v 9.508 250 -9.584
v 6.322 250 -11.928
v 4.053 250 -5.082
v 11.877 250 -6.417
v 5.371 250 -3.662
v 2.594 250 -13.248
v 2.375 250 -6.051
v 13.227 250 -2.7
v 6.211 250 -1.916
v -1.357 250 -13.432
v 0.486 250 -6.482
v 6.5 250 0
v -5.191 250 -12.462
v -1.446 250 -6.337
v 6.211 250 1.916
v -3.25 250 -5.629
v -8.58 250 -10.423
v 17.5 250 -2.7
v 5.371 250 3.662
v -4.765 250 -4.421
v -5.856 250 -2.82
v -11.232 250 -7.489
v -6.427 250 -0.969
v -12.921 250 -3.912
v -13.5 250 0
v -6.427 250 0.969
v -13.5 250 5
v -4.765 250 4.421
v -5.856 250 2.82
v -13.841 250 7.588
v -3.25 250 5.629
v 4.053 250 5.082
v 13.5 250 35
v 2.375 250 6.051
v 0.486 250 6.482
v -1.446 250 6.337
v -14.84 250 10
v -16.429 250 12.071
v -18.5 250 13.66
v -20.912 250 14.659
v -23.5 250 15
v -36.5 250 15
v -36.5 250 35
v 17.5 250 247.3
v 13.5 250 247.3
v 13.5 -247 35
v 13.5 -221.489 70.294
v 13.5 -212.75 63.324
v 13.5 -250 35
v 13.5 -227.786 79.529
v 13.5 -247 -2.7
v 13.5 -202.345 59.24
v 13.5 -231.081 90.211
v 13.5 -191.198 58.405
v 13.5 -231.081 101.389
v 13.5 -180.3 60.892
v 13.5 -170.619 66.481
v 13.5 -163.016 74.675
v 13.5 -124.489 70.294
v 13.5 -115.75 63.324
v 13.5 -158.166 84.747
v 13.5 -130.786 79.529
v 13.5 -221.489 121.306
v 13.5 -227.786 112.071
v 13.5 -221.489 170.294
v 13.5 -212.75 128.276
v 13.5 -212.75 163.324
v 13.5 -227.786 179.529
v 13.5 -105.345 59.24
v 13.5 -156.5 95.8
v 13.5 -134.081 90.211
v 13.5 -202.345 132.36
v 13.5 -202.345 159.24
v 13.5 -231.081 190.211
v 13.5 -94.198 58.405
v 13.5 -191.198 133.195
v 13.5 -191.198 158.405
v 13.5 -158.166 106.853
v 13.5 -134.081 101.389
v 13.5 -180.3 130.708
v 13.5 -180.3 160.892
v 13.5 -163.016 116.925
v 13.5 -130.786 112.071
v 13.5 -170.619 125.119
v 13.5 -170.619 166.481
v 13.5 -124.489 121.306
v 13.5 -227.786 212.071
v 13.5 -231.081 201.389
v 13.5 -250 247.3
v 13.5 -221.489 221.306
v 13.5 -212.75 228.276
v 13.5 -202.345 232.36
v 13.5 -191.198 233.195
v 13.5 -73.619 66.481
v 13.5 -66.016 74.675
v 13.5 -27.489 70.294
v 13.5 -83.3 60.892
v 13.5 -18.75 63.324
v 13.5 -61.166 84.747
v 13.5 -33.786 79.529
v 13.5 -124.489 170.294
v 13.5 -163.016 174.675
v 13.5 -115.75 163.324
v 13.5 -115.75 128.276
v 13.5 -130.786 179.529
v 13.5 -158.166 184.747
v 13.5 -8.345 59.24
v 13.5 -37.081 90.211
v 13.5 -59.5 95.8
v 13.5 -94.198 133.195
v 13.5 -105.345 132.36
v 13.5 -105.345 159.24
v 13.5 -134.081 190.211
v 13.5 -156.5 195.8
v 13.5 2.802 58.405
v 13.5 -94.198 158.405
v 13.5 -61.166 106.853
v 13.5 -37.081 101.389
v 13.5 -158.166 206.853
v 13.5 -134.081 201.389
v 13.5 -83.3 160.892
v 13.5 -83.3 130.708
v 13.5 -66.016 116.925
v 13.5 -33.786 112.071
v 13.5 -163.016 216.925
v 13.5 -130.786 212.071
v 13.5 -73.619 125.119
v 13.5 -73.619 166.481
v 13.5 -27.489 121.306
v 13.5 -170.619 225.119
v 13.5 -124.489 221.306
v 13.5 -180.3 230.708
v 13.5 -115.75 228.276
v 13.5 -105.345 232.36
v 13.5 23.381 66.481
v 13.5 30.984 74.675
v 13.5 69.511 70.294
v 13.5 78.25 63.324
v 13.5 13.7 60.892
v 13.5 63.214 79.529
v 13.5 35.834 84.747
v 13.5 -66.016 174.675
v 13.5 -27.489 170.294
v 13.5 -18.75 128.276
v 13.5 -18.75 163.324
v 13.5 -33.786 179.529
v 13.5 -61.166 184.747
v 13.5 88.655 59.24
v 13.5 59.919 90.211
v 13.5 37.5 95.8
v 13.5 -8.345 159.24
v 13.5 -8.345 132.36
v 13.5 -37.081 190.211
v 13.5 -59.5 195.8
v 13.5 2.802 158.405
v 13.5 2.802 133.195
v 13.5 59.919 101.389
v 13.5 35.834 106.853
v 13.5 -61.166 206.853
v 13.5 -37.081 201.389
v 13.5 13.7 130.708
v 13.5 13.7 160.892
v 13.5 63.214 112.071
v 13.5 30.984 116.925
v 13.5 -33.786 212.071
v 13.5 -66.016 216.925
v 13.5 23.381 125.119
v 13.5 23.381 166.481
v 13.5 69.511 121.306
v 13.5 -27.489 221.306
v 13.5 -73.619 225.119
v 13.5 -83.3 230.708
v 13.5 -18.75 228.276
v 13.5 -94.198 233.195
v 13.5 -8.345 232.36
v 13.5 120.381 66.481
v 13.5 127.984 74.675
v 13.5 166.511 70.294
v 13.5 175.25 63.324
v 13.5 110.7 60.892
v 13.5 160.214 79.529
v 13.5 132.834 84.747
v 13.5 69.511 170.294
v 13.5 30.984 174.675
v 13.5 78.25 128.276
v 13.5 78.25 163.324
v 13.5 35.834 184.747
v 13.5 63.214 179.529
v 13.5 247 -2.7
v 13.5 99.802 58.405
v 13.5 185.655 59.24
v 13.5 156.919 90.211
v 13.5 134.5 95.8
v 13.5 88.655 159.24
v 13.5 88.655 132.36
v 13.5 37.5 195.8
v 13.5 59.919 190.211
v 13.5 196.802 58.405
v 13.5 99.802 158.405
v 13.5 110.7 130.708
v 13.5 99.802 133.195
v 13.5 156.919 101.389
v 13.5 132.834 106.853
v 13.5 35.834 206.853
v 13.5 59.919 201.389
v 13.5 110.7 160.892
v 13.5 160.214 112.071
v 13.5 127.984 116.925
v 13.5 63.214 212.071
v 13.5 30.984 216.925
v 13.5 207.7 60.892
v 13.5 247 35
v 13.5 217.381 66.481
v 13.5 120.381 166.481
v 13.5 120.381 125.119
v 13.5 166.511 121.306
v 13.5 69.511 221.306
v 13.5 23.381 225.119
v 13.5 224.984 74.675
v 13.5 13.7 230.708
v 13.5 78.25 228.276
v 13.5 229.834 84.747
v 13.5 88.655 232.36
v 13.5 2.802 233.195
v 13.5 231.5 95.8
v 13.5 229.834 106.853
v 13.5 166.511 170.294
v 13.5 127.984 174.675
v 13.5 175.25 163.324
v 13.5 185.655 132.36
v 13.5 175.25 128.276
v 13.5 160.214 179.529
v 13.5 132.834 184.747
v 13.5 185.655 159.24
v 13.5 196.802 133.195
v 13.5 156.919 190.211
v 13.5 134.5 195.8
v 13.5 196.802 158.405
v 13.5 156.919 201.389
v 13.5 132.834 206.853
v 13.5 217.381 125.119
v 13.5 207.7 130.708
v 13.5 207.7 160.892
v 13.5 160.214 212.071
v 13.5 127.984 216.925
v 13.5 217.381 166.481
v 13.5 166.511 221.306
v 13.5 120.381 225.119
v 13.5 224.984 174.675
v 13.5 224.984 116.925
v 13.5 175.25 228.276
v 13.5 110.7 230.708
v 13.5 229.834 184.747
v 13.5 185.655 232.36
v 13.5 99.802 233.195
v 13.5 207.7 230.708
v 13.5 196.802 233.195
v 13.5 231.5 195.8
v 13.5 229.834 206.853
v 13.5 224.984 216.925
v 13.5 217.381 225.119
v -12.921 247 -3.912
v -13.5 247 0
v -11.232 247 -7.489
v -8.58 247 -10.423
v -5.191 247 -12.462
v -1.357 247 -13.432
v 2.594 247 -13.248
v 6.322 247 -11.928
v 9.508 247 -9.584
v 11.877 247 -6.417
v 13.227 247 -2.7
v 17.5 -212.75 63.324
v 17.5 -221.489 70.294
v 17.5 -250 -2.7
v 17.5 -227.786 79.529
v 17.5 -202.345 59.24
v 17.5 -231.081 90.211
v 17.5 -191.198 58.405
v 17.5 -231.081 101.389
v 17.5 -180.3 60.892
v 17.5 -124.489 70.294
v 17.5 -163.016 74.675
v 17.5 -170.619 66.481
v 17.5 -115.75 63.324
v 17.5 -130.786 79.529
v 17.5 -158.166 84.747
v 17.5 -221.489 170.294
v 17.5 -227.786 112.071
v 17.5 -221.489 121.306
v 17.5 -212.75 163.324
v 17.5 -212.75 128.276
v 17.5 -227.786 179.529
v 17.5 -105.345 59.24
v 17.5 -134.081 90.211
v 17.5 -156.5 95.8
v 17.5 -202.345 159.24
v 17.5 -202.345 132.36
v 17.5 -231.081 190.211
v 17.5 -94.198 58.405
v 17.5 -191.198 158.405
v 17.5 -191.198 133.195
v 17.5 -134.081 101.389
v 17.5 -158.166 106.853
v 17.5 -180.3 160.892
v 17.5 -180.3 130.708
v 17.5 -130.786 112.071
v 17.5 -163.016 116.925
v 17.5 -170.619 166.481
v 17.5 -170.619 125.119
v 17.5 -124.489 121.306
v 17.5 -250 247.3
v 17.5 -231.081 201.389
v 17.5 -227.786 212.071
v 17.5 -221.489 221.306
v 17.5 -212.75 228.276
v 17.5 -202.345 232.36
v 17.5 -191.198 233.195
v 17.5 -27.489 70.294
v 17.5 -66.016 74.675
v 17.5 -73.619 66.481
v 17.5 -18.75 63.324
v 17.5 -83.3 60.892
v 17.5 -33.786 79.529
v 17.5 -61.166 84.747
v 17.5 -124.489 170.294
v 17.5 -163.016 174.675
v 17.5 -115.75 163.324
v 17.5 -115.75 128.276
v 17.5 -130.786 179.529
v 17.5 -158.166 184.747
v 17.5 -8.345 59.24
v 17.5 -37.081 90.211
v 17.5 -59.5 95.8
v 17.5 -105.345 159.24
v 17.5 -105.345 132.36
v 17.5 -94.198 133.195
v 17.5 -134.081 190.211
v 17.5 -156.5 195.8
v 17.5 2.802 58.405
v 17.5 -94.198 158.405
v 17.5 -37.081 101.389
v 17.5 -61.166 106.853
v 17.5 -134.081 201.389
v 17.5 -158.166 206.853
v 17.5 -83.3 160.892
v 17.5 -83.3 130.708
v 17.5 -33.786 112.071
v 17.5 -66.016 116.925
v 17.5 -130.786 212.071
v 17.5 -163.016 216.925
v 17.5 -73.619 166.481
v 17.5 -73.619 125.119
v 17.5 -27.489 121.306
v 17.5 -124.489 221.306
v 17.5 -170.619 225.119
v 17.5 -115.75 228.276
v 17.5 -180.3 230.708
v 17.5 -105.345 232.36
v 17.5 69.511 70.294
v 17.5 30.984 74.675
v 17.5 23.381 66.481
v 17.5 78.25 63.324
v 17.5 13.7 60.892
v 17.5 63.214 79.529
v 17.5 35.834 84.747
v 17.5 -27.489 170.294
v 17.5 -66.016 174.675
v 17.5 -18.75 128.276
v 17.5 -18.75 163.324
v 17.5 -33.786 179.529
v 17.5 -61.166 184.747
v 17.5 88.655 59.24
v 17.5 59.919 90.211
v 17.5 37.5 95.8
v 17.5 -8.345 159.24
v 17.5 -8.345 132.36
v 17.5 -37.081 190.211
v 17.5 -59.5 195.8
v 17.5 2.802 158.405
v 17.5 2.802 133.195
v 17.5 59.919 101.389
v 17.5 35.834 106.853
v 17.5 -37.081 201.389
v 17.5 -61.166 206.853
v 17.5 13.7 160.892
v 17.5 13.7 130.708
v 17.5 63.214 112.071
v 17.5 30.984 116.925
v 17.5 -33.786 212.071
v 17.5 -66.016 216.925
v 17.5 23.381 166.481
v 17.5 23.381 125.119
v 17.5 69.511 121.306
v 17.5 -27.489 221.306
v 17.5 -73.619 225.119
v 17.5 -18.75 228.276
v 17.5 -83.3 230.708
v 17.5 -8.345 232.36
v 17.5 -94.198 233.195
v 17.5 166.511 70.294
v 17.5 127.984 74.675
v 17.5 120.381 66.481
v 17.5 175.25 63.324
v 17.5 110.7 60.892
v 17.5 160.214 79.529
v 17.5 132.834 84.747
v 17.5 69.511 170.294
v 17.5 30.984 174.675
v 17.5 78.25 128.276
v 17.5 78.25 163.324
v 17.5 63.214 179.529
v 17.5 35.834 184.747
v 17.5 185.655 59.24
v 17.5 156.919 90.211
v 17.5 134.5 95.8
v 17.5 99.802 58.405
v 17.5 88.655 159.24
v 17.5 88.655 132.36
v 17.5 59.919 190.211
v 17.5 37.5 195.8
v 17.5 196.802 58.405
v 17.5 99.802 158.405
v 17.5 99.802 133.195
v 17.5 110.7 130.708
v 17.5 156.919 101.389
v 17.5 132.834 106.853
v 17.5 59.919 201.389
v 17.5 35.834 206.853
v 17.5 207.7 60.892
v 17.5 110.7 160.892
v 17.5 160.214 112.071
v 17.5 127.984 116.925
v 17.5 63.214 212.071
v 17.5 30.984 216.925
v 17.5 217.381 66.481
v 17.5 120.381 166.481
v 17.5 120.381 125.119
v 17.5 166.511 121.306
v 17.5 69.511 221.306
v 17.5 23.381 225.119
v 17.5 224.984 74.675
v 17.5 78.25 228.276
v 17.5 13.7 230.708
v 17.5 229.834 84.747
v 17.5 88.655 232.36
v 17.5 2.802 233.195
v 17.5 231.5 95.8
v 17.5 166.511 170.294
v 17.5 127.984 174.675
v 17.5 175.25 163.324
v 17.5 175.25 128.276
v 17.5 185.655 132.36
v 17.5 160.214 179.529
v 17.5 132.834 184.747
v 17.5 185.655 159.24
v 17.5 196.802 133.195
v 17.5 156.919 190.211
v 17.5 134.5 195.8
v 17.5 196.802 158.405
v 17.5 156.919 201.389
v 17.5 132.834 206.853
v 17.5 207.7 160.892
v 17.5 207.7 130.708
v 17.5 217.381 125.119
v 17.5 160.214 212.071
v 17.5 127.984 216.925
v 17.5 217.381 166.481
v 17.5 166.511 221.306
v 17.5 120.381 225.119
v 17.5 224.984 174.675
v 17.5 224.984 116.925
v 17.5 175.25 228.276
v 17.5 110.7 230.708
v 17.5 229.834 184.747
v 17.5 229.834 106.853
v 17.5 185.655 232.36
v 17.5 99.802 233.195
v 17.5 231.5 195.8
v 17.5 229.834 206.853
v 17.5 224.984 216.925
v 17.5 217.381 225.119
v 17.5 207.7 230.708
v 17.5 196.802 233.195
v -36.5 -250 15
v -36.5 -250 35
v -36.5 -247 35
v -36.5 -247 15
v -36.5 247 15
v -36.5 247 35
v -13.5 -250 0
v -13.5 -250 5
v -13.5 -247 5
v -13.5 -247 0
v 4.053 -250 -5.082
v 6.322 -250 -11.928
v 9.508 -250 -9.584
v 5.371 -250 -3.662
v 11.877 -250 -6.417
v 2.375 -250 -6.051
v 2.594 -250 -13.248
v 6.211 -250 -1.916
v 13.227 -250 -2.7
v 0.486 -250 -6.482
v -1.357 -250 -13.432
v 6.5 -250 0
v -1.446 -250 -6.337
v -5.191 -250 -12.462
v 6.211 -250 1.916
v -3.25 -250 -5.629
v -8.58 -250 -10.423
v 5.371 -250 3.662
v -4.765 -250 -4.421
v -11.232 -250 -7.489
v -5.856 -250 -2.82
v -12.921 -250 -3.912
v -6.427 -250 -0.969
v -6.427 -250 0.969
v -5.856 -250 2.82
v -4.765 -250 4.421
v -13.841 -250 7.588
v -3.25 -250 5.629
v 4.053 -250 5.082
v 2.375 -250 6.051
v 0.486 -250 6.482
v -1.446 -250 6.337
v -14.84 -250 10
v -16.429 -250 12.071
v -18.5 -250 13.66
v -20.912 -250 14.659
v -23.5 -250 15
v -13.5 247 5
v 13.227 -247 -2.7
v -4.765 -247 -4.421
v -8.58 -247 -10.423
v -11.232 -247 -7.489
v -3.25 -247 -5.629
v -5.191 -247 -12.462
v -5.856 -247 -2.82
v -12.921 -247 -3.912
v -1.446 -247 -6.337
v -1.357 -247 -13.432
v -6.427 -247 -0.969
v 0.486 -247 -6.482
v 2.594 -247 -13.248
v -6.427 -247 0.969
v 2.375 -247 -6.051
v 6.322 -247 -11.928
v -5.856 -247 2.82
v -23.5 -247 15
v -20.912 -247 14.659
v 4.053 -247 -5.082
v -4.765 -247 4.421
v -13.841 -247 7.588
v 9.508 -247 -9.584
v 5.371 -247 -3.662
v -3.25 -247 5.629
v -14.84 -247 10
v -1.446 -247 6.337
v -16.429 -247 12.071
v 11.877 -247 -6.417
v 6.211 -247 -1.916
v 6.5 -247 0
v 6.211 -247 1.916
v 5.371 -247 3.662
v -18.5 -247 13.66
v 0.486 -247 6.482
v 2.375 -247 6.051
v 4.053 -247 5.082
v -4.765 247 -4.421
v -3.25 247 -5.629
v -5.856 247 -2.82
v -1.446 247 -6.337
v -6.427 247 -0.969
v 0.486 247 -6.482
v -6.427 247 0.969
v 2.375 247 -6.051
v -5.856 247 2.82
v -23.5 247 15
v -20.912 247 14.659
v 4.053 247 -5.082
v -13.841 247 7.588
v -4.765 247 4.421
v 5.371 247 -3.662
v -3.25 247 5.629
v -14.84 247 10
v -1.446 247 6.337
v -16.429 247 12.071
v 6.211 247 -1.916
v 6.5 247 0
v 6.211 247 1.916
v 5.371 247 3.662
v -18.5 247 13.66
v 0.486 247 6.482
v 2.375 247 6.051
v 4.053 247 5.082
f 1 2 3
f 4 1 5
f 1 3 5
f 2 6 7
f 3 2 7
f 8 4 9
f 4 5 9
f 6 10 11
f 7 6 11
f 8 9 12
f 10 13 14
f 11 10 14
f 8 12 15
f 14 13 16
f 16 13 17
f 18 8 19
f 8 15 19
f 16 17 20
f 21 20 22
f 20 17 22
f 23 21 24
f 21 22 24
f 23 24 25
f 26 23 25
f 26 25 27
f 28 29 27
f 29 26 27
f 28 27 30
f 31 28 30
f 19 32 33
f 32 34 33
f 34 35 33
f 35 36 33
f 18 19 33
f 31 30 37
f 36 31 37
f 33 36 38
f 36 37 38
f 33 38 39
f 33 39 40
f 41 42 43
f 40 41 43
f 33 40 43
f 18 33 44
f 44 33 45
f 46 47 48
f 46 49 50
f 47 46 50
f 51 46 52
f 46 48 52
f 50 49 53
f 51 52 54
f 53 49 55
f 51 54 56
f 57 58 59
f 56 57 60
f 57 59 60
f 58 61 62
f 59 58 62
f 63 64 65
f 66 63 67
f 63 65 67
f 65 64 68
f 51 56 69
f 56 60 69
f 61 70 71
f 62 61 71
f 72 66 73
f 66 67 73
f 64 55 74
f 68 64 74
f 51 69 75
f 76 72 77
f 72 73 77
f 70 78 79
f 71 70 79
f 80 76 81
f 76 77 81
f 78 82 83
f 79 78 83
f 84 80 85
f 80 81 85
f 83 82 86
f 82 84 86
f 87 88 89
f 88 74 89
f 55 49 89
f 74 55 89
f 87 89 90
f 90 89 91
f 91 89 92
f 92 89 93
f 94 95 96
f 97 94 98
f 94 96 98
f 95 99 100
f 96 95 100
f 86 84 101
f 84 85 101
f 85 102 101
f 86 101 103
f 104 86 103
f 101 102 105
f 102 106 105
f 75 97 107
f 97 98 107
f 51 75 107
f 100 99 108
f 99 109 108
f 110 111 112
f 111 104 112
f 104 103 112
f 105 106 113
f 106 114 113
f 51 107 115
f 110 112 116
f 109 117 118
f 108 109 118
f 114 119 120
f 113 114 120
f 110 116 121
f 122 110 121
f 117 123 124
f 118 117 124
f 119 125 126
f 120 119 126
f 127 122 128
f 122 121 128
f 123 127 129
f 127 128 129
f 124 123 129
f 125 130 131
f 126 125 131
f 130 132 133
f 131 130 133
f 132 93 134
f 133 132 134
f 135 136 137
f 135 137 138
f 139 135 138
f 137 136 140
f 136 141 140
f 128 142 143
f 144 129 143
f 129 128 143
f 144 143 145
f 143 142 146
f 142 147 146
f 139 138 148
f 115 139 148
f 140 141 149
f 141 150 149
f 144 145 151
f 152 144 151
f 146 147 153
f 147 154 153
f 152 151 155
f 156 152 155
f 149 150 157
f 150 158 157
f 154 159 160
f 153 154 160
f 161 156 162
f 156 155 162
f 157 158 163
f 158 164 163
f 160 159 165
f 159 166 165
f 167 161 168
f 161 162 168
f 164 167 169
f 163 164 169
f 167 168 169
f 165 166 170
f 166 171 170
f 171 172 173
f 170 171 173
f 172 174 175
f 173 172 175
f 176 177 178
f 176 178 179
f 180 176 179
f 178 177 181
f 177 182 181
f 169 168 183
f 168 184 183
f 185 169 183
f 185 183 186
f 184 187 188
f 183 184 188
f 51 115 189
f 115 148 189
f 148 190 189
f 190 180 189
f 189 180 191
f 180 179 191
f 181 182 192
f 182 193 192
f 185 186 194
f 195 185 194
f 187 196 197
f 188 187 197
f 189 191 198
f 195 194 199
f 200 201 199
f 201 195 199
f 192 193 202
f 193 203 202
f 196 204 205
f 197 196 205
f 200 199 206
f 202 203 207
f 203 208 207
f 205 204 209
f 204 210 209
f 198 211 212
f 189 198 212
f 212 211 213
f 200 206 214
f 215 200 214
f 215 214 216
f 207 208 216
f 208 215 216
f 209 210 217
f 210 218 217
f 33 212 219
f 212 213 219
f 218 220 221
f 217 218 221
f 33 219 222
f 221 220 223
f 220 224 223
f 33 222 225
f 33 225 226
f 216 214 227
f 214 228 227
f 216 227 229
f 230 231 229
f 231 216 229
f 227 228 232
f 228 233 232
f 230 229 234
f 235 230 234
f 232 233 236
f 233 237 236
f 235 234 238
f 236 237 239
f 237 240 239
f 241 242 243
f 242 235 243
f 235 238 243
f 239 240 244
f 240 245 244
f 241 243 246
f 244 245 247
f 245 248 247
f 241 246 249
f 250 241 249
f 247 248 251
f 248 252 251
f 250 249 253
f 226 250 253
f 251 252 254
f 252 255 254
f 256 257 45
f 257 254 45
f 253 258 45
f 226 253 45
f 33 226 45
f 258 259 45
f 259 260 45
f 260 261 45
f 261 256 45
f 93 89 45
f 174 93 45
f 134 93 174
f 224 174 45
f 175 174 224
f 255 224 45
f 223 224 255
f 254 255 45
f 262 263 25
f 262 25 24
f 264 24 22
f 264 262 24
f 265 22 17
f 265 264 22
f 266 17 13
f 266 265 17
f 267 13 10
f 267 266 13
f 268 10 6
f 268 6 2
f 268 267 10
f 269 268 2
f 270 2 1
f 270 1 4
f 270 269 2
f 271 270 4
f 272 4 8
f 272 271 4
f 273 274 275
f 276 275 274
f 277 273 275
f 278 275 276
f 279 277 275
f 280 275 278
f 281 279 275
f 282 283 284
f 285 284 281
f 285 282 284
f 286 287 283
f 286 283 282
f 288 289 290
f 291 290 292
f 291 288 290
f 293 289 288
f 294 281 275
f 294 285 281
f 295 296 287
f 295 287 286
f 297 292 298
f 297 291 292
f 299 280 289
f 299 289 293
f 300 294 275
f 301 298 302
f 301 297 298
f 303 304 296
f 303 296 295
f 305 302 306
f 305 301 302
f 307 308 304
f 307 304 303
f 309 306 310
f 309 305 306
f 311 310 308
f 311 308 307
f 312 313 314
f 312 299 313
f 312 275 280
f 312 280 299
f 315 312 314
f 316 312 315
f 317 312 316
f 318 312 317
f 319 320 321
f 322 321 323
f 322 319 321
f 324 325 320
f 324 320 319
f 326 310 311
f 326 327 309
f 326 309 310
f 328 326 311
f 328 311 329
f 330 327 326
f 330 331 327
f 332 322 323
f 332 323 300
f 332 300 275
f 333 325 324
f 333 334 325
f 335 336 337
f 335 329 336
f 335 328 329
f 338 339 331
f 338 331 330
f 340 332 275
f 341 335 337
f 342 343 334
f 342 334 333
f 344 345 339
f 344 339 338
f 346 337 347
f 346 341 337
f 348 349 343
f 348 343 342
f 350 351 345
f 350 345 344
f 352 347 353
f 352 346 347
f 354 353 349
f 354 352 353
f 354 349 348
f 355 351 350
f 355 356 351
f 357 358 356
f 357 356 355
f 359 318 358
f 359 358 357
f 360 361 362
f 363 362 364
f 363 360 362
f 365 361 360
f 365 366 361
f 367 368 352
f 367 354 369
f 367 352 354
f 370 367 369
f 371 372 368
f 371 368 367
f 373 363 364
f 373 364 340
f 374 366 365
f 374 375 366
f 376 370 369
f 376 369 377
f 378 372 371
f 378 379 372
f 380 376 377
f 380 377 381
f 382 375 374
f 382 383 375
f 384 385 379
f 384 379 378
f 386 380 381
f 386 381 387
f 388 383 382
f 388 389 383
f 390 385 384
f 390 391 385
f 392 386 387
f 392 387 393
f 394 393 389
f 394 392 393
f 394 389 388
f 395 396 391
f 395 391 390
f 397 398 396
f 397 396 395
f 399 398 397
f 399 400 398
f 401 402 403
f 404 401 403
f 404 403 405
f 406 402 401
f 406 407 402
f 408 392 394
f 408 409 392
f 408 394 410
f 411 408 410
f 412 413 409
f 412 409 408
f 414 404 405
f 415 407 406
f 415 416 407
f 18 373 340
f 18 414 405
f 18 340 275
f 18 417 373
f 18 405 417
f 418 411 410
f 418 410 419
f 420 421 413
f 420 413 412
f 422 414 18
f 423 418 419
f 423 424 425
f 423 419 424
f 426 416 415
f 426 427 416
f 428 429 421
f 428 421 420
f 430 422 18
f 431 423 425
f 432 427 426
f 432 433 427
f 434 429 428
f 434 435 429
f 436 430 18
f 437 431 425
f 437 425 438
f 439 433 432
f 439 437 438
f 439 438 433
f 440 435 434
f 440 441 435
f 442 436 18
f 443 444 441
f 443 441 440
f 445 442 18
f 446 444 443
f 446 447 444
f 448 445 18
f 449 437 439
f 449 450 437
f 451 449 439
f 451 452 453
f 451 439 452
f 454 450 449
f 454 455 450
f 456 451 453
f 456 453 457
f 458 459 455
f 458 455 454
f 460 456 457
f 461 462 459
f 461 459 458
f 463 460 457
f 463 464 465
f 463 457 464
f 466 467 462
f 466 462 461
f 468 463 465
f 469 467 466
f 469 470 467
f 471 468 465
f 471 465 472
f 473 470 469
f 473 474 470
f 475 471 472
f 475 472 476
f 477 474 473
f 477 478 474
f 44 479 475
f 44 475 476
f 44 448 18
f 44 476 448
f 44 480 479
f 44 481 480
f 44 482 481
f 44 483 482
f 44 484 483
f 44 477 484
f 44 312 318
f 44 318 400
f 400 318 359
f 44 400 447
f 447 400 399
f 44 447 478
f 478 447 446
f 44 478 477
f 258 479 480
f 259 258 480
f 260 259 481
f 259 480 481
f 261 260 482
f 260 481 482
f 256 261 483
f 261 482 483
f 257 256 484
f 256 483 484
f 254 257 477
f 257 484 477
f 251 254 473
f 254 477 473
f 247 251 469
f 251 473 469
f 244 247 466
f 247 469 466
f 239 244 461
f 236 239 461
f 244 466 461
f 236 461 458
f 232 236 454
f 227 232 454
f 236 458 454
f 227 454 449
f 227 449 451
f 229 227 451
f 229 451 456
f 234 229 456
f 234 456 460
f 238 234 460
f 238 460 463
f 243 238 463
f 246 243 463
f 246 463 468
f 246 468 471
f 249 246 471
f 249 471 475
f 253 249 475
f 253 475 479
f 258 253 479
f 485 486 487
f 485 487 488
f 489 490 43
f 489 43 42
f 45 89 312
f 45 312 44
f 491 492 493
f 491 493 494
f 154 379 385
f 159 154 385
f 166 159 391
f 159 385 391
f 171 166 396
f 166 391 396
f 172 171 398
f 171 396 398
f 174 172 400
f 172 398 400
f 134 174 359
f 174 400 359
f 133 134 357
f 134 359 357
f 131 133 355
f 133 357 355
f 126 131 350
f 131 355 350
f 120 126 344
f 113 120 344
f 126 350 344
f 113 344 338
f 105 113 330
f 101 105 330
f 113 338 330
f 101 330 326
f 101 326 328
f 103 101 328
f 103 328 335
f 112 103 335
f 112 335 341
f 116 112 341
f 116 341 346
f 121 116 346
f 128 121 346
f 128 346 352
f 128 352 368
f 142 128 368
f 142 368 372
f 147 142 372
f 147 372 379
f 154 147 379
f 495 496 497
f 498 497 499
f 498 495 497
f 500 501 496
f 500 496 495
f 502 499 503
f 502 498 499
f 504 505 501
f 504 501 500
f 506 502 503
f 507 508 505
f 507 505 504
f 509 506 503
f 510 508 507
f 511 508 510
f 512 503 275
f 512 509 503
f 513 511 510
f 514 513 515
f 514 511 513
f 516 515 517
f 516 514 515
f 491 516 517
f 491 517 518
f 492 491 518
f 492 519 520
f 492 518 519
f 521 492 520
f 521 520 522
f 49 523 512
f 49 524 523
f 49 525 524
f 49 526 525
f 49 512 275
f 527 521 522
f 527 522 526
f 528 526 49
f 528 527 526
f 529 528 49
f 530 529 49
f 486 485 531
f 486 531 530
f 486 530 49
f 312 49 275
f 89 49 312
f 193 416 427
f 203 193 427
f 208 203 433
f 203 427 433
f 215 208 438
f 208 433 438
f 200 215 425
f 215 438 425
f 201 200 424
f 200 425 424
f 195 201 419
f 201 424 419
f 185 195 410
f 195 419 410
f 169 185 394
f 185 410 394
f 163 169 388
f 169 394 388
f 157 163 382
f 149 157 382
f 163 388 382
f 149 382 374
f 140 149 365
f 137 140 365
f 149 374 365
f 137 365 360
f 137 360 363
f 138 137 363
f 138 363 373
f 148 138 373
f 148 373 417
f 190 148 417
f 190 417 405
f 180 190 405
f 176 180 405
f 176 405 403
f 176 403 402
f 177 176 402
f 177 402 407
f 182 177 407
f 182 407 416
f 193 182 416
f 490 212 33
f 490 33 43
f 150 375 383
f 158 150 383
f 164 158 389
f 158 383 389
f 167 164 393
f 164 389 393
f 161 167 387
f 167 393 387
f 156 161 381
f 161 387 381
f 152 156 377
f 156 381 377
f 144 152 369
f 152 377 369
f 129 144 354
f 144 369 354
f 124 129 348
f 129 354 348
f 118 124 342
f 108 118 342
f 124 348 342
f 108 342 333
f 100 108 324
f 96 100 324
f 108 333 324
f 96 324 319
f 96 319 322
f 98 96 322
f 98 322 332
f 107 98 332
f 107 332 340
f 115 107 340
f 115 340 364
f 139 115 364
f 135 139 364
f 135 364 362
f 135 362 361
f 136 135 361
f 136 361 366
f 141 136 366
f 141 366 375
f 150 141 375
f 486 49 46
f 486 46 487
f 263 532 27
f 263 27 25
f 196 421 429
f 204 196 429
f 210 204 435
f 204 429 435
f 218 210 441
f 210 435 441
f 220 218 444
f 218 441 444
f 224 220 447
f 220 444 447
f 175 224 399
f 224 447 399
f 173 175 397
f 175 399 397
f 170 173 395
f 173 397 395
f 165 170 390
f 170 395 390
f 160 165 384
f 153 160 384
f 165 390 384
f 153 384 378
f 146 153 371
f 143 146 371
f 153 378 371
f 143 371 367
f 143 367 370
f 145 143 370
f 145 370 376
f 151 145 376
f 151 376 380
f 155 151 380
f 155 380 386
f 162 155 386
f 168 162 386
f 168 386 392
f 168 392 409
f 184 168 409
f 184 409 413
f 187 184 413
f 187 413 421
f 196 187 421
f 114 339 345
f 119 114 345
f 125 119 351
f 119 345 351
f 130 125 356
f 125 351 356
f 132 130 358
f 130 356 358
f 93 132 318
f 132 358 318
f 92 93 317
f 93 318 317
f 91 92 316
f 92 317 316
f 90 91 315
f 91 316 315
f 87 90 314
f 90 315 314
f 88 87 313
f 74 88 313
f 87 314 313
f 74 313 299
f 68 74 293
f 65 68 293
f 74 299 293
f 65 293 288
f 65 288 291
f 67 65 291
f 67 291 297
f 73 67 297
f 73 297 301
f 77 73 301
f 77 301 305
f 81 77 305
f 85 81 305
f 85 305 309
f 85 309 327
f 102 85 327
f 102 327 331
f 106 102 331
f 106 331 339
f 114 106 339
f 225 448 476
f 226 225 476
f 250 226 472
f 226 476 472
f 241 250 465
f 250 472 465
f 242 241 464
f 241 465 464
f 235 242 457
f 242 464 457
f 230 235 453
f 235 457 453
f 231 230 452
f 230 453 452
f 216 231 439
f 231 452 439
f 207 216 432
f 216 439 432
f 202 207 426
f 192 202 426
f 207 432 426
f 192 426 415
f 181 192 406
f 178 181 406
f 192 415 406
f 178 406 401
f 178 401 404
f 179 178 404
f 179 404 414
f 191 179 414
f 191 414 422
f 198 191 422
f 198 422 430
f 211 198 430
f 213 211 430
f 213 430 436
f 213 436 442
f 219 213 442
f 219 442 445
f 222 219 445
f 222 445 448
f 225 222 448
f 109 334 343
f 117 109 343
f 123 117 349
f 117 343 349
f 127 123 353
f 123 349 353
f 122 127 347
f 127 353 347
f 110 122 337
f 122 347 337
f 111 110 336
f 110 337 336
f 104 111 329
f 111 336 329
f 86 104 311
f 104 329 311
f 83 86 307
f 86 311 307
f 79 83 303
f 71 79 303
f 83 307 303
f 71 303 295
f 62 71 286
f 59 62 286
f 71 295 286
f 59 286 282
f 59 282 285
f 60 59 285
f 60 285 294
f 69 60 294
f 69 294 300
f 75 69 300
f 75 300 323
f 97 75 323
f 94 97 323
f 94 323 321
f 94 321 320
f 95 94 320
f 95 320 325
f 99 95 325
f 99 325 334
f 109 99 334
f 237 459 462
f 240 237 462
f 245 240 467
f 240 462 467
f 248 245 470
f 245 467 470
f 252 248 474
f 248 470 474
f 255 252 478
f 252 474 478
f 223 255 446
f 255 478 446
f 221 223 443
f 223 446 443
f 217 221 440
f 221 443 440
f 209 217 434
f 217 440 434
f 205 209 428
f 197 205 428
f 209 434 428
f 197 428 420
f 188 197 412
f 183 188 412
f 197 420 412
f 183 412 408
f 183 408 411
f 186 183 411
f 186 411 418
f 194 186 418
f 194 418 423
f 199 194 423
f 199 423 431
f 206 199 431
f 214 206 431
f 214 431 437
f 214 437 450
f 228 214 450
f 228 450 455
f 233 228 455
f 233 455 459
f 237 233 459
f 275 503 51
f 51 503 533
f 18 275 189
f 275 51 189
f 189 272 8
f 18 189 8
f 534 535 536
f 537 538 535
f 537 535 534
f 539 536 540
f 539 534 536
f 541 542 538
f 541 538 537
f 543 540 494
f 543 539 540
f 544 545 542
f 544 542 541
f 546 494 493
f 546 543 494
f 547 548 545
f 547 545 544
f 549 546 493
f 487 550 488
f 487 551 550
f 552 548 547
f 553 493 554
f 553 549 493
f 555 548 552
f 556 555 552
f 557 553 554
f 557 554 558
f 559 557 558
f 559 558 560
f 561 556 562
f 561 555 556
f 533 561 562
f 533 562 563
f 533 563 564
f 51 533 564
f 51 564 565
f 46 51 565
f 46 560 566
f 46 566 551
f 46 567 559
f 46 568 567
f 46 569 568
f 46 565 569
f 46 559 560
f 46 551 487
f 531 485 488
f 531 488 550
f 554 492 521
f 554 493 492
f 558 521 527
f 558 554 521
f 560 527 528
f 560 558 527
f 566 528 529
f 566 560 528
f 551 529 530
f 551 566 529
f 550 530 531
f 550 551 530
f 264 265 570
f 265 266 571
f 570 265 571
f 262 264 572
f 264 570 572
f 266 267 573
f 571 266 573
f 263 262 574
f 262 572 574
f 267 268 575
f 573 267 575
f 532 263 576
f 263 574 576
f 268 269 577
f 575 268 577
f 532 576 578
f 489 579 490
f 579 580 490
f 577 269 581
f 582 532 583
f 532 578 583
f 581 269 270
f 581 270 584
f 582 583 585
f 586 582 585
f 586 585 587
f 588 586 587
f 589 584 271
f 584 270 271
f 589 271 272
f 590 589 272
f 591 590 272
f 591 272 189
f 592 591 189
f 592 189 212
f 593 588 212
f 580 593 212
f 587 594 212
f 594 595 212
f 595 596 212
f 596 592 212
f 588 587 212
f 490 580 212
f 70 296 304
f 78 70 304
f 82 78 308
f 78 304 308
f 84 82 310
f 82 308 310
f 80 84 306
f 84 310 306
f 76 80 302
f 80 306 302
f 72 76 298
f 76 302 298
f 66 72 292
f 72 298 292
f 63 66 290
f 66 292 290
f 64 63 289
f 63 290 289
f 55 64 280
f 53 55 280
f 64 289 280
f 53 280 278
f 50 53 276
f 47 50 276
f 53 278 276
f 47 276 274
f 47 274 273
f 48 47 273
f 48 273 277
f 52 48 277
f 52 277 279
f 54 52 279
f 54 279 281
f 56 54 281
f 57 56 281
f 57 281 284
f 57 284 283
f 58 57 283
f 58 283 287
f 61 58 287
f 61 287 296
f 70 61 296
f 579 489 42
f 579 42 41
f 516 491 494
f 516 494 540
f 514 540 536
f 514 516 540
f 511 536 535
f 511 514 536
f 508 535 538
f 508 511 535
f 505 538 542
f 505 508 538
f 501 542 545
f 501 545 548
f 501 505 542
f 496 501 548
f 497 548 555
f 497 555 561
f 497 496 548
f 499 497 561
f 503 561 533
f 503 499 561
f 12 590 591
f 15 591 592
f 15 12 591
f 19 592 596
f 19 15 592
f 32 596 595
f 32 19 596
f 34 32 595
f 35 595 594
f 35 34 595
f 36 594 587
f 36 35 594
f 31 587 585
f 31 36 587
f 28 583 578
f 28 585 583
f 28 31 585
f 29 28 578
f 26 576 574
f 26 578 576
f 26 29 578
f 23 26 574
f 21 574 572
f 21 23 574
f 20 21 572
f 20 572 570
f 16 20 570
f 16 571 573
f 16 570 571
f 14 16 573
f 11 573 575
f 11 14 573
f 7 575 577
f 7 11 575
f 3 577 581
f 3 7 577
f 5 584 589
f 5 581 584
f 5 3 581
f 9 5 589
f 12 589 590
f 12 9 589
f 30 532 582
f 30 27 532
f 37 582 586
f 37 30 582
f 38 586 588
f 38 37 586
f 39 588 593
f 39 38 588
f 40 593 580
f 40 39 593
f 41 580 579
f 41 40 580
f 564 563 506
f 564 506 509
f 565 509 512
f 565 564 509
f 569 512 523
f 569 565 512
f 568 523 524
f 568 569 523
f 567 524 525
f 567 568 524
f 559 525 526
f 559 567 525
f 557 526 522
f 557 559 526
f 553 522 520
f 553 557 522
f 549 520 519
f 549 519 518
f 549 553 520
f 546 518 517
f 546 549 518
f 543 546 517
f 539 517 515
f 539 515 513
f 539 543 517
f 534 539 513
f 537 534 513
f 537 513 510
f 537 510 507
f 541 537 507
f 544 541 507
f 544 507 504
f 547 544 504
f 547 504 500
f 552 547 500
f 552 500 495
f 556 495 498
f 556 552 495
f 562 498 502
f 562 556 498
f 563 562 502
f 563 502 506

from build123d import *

# Parameters (mm, degrees)
F0_R     = 6.5
F1_DEPTH = 250
F2_W     = 494
F2_H     = 100
F3_DEPTH = 100
F4_R     = 10
F5_W     = 500
F5_H     = 250
F6_DEPTH = 4
F7_R     = 37.5
F8_DEPTH = 25


with BuildPart() as f1:
    # F0 (on Front) → F1 (new body, symmetric)
    with BuildSketch(Plane.XZ):
        with BuildLine():
            Line((-13.5, 15), (-13.5, 0))
            ThreePointArc((-13.5, 0), (-1.356871, -13.431638), (13.227245, -2.7))
            Line((13.227245, -2.7), (13.5, -2.7))
            Line((13.5, -2.7), (13.5, 15))
            Line((13.5, 15), (13.5, 35))
            Line((13.5, 35), (-36.5, 35))
            Line((-36.5, 35), (-36.5, 15))
            Line((-36.5, 15), (-13.5, 15))
        make_face()
        Circle(F0_R, mode=Mode.SUBTRACT)
    extrude(amount=F1_DEPTH, both=True)

    # F2 (on face) → F3 (cut)
    with BuildSketch(Plane.YZ.offset(13.5)):
        Rectangle(F2_W, F2_H)
    extrude(amount=-F3_DEPTH, mode=Mode.SUBTRACT)

    # F4
    f4_edges = [f1.edges().sort_by_distance(p)[0] for p in [
        (-13.5, 248.5, 15),
        (-13.5, -248.5, 15),
    ]]
    fillet(f4_edges, radius=F4_R)

    # F5 (on face) → F6 (join)
    with BuildSketch(Plane.YZ.offset(13.5)):
        with Locations((0, 122.3)):
            Rectangle(F5_W, F5_H)
    extrude(amount=F6_DEPTH)

    # F7 (on face) → F8 (cut)
    with BuildSketch(Plane.YZ.offset(17.5)):
        with Locations((-194, 95.8)):
            Circle(F7_R)
        with Locations((-194, 195.8)):
            Circle(F7_R)
        with Locations((-97, 95.8)):
            Circle(F7_R)
        with Locations((-97, 195.8)):
            Circle(F7_R)
        with Locations((0, 95.8)):
            Circle(F7_R)
        with Locations((0, 195.8)):
            Circle(F7_R)
        with Locations((97, 95.8)):
            Circle(F7_R)
        with Locations((97, 195.8)):
            Circle(F7_R)
        with Locations((194, 95.8)):
            Circle(F7_R)
        with Locations((194, 195.8)):
            Circle(F7_R)
    extrude(amount=-F8_DEPTH, mode=Mode.SUBTRACT)


solid = f1.part
